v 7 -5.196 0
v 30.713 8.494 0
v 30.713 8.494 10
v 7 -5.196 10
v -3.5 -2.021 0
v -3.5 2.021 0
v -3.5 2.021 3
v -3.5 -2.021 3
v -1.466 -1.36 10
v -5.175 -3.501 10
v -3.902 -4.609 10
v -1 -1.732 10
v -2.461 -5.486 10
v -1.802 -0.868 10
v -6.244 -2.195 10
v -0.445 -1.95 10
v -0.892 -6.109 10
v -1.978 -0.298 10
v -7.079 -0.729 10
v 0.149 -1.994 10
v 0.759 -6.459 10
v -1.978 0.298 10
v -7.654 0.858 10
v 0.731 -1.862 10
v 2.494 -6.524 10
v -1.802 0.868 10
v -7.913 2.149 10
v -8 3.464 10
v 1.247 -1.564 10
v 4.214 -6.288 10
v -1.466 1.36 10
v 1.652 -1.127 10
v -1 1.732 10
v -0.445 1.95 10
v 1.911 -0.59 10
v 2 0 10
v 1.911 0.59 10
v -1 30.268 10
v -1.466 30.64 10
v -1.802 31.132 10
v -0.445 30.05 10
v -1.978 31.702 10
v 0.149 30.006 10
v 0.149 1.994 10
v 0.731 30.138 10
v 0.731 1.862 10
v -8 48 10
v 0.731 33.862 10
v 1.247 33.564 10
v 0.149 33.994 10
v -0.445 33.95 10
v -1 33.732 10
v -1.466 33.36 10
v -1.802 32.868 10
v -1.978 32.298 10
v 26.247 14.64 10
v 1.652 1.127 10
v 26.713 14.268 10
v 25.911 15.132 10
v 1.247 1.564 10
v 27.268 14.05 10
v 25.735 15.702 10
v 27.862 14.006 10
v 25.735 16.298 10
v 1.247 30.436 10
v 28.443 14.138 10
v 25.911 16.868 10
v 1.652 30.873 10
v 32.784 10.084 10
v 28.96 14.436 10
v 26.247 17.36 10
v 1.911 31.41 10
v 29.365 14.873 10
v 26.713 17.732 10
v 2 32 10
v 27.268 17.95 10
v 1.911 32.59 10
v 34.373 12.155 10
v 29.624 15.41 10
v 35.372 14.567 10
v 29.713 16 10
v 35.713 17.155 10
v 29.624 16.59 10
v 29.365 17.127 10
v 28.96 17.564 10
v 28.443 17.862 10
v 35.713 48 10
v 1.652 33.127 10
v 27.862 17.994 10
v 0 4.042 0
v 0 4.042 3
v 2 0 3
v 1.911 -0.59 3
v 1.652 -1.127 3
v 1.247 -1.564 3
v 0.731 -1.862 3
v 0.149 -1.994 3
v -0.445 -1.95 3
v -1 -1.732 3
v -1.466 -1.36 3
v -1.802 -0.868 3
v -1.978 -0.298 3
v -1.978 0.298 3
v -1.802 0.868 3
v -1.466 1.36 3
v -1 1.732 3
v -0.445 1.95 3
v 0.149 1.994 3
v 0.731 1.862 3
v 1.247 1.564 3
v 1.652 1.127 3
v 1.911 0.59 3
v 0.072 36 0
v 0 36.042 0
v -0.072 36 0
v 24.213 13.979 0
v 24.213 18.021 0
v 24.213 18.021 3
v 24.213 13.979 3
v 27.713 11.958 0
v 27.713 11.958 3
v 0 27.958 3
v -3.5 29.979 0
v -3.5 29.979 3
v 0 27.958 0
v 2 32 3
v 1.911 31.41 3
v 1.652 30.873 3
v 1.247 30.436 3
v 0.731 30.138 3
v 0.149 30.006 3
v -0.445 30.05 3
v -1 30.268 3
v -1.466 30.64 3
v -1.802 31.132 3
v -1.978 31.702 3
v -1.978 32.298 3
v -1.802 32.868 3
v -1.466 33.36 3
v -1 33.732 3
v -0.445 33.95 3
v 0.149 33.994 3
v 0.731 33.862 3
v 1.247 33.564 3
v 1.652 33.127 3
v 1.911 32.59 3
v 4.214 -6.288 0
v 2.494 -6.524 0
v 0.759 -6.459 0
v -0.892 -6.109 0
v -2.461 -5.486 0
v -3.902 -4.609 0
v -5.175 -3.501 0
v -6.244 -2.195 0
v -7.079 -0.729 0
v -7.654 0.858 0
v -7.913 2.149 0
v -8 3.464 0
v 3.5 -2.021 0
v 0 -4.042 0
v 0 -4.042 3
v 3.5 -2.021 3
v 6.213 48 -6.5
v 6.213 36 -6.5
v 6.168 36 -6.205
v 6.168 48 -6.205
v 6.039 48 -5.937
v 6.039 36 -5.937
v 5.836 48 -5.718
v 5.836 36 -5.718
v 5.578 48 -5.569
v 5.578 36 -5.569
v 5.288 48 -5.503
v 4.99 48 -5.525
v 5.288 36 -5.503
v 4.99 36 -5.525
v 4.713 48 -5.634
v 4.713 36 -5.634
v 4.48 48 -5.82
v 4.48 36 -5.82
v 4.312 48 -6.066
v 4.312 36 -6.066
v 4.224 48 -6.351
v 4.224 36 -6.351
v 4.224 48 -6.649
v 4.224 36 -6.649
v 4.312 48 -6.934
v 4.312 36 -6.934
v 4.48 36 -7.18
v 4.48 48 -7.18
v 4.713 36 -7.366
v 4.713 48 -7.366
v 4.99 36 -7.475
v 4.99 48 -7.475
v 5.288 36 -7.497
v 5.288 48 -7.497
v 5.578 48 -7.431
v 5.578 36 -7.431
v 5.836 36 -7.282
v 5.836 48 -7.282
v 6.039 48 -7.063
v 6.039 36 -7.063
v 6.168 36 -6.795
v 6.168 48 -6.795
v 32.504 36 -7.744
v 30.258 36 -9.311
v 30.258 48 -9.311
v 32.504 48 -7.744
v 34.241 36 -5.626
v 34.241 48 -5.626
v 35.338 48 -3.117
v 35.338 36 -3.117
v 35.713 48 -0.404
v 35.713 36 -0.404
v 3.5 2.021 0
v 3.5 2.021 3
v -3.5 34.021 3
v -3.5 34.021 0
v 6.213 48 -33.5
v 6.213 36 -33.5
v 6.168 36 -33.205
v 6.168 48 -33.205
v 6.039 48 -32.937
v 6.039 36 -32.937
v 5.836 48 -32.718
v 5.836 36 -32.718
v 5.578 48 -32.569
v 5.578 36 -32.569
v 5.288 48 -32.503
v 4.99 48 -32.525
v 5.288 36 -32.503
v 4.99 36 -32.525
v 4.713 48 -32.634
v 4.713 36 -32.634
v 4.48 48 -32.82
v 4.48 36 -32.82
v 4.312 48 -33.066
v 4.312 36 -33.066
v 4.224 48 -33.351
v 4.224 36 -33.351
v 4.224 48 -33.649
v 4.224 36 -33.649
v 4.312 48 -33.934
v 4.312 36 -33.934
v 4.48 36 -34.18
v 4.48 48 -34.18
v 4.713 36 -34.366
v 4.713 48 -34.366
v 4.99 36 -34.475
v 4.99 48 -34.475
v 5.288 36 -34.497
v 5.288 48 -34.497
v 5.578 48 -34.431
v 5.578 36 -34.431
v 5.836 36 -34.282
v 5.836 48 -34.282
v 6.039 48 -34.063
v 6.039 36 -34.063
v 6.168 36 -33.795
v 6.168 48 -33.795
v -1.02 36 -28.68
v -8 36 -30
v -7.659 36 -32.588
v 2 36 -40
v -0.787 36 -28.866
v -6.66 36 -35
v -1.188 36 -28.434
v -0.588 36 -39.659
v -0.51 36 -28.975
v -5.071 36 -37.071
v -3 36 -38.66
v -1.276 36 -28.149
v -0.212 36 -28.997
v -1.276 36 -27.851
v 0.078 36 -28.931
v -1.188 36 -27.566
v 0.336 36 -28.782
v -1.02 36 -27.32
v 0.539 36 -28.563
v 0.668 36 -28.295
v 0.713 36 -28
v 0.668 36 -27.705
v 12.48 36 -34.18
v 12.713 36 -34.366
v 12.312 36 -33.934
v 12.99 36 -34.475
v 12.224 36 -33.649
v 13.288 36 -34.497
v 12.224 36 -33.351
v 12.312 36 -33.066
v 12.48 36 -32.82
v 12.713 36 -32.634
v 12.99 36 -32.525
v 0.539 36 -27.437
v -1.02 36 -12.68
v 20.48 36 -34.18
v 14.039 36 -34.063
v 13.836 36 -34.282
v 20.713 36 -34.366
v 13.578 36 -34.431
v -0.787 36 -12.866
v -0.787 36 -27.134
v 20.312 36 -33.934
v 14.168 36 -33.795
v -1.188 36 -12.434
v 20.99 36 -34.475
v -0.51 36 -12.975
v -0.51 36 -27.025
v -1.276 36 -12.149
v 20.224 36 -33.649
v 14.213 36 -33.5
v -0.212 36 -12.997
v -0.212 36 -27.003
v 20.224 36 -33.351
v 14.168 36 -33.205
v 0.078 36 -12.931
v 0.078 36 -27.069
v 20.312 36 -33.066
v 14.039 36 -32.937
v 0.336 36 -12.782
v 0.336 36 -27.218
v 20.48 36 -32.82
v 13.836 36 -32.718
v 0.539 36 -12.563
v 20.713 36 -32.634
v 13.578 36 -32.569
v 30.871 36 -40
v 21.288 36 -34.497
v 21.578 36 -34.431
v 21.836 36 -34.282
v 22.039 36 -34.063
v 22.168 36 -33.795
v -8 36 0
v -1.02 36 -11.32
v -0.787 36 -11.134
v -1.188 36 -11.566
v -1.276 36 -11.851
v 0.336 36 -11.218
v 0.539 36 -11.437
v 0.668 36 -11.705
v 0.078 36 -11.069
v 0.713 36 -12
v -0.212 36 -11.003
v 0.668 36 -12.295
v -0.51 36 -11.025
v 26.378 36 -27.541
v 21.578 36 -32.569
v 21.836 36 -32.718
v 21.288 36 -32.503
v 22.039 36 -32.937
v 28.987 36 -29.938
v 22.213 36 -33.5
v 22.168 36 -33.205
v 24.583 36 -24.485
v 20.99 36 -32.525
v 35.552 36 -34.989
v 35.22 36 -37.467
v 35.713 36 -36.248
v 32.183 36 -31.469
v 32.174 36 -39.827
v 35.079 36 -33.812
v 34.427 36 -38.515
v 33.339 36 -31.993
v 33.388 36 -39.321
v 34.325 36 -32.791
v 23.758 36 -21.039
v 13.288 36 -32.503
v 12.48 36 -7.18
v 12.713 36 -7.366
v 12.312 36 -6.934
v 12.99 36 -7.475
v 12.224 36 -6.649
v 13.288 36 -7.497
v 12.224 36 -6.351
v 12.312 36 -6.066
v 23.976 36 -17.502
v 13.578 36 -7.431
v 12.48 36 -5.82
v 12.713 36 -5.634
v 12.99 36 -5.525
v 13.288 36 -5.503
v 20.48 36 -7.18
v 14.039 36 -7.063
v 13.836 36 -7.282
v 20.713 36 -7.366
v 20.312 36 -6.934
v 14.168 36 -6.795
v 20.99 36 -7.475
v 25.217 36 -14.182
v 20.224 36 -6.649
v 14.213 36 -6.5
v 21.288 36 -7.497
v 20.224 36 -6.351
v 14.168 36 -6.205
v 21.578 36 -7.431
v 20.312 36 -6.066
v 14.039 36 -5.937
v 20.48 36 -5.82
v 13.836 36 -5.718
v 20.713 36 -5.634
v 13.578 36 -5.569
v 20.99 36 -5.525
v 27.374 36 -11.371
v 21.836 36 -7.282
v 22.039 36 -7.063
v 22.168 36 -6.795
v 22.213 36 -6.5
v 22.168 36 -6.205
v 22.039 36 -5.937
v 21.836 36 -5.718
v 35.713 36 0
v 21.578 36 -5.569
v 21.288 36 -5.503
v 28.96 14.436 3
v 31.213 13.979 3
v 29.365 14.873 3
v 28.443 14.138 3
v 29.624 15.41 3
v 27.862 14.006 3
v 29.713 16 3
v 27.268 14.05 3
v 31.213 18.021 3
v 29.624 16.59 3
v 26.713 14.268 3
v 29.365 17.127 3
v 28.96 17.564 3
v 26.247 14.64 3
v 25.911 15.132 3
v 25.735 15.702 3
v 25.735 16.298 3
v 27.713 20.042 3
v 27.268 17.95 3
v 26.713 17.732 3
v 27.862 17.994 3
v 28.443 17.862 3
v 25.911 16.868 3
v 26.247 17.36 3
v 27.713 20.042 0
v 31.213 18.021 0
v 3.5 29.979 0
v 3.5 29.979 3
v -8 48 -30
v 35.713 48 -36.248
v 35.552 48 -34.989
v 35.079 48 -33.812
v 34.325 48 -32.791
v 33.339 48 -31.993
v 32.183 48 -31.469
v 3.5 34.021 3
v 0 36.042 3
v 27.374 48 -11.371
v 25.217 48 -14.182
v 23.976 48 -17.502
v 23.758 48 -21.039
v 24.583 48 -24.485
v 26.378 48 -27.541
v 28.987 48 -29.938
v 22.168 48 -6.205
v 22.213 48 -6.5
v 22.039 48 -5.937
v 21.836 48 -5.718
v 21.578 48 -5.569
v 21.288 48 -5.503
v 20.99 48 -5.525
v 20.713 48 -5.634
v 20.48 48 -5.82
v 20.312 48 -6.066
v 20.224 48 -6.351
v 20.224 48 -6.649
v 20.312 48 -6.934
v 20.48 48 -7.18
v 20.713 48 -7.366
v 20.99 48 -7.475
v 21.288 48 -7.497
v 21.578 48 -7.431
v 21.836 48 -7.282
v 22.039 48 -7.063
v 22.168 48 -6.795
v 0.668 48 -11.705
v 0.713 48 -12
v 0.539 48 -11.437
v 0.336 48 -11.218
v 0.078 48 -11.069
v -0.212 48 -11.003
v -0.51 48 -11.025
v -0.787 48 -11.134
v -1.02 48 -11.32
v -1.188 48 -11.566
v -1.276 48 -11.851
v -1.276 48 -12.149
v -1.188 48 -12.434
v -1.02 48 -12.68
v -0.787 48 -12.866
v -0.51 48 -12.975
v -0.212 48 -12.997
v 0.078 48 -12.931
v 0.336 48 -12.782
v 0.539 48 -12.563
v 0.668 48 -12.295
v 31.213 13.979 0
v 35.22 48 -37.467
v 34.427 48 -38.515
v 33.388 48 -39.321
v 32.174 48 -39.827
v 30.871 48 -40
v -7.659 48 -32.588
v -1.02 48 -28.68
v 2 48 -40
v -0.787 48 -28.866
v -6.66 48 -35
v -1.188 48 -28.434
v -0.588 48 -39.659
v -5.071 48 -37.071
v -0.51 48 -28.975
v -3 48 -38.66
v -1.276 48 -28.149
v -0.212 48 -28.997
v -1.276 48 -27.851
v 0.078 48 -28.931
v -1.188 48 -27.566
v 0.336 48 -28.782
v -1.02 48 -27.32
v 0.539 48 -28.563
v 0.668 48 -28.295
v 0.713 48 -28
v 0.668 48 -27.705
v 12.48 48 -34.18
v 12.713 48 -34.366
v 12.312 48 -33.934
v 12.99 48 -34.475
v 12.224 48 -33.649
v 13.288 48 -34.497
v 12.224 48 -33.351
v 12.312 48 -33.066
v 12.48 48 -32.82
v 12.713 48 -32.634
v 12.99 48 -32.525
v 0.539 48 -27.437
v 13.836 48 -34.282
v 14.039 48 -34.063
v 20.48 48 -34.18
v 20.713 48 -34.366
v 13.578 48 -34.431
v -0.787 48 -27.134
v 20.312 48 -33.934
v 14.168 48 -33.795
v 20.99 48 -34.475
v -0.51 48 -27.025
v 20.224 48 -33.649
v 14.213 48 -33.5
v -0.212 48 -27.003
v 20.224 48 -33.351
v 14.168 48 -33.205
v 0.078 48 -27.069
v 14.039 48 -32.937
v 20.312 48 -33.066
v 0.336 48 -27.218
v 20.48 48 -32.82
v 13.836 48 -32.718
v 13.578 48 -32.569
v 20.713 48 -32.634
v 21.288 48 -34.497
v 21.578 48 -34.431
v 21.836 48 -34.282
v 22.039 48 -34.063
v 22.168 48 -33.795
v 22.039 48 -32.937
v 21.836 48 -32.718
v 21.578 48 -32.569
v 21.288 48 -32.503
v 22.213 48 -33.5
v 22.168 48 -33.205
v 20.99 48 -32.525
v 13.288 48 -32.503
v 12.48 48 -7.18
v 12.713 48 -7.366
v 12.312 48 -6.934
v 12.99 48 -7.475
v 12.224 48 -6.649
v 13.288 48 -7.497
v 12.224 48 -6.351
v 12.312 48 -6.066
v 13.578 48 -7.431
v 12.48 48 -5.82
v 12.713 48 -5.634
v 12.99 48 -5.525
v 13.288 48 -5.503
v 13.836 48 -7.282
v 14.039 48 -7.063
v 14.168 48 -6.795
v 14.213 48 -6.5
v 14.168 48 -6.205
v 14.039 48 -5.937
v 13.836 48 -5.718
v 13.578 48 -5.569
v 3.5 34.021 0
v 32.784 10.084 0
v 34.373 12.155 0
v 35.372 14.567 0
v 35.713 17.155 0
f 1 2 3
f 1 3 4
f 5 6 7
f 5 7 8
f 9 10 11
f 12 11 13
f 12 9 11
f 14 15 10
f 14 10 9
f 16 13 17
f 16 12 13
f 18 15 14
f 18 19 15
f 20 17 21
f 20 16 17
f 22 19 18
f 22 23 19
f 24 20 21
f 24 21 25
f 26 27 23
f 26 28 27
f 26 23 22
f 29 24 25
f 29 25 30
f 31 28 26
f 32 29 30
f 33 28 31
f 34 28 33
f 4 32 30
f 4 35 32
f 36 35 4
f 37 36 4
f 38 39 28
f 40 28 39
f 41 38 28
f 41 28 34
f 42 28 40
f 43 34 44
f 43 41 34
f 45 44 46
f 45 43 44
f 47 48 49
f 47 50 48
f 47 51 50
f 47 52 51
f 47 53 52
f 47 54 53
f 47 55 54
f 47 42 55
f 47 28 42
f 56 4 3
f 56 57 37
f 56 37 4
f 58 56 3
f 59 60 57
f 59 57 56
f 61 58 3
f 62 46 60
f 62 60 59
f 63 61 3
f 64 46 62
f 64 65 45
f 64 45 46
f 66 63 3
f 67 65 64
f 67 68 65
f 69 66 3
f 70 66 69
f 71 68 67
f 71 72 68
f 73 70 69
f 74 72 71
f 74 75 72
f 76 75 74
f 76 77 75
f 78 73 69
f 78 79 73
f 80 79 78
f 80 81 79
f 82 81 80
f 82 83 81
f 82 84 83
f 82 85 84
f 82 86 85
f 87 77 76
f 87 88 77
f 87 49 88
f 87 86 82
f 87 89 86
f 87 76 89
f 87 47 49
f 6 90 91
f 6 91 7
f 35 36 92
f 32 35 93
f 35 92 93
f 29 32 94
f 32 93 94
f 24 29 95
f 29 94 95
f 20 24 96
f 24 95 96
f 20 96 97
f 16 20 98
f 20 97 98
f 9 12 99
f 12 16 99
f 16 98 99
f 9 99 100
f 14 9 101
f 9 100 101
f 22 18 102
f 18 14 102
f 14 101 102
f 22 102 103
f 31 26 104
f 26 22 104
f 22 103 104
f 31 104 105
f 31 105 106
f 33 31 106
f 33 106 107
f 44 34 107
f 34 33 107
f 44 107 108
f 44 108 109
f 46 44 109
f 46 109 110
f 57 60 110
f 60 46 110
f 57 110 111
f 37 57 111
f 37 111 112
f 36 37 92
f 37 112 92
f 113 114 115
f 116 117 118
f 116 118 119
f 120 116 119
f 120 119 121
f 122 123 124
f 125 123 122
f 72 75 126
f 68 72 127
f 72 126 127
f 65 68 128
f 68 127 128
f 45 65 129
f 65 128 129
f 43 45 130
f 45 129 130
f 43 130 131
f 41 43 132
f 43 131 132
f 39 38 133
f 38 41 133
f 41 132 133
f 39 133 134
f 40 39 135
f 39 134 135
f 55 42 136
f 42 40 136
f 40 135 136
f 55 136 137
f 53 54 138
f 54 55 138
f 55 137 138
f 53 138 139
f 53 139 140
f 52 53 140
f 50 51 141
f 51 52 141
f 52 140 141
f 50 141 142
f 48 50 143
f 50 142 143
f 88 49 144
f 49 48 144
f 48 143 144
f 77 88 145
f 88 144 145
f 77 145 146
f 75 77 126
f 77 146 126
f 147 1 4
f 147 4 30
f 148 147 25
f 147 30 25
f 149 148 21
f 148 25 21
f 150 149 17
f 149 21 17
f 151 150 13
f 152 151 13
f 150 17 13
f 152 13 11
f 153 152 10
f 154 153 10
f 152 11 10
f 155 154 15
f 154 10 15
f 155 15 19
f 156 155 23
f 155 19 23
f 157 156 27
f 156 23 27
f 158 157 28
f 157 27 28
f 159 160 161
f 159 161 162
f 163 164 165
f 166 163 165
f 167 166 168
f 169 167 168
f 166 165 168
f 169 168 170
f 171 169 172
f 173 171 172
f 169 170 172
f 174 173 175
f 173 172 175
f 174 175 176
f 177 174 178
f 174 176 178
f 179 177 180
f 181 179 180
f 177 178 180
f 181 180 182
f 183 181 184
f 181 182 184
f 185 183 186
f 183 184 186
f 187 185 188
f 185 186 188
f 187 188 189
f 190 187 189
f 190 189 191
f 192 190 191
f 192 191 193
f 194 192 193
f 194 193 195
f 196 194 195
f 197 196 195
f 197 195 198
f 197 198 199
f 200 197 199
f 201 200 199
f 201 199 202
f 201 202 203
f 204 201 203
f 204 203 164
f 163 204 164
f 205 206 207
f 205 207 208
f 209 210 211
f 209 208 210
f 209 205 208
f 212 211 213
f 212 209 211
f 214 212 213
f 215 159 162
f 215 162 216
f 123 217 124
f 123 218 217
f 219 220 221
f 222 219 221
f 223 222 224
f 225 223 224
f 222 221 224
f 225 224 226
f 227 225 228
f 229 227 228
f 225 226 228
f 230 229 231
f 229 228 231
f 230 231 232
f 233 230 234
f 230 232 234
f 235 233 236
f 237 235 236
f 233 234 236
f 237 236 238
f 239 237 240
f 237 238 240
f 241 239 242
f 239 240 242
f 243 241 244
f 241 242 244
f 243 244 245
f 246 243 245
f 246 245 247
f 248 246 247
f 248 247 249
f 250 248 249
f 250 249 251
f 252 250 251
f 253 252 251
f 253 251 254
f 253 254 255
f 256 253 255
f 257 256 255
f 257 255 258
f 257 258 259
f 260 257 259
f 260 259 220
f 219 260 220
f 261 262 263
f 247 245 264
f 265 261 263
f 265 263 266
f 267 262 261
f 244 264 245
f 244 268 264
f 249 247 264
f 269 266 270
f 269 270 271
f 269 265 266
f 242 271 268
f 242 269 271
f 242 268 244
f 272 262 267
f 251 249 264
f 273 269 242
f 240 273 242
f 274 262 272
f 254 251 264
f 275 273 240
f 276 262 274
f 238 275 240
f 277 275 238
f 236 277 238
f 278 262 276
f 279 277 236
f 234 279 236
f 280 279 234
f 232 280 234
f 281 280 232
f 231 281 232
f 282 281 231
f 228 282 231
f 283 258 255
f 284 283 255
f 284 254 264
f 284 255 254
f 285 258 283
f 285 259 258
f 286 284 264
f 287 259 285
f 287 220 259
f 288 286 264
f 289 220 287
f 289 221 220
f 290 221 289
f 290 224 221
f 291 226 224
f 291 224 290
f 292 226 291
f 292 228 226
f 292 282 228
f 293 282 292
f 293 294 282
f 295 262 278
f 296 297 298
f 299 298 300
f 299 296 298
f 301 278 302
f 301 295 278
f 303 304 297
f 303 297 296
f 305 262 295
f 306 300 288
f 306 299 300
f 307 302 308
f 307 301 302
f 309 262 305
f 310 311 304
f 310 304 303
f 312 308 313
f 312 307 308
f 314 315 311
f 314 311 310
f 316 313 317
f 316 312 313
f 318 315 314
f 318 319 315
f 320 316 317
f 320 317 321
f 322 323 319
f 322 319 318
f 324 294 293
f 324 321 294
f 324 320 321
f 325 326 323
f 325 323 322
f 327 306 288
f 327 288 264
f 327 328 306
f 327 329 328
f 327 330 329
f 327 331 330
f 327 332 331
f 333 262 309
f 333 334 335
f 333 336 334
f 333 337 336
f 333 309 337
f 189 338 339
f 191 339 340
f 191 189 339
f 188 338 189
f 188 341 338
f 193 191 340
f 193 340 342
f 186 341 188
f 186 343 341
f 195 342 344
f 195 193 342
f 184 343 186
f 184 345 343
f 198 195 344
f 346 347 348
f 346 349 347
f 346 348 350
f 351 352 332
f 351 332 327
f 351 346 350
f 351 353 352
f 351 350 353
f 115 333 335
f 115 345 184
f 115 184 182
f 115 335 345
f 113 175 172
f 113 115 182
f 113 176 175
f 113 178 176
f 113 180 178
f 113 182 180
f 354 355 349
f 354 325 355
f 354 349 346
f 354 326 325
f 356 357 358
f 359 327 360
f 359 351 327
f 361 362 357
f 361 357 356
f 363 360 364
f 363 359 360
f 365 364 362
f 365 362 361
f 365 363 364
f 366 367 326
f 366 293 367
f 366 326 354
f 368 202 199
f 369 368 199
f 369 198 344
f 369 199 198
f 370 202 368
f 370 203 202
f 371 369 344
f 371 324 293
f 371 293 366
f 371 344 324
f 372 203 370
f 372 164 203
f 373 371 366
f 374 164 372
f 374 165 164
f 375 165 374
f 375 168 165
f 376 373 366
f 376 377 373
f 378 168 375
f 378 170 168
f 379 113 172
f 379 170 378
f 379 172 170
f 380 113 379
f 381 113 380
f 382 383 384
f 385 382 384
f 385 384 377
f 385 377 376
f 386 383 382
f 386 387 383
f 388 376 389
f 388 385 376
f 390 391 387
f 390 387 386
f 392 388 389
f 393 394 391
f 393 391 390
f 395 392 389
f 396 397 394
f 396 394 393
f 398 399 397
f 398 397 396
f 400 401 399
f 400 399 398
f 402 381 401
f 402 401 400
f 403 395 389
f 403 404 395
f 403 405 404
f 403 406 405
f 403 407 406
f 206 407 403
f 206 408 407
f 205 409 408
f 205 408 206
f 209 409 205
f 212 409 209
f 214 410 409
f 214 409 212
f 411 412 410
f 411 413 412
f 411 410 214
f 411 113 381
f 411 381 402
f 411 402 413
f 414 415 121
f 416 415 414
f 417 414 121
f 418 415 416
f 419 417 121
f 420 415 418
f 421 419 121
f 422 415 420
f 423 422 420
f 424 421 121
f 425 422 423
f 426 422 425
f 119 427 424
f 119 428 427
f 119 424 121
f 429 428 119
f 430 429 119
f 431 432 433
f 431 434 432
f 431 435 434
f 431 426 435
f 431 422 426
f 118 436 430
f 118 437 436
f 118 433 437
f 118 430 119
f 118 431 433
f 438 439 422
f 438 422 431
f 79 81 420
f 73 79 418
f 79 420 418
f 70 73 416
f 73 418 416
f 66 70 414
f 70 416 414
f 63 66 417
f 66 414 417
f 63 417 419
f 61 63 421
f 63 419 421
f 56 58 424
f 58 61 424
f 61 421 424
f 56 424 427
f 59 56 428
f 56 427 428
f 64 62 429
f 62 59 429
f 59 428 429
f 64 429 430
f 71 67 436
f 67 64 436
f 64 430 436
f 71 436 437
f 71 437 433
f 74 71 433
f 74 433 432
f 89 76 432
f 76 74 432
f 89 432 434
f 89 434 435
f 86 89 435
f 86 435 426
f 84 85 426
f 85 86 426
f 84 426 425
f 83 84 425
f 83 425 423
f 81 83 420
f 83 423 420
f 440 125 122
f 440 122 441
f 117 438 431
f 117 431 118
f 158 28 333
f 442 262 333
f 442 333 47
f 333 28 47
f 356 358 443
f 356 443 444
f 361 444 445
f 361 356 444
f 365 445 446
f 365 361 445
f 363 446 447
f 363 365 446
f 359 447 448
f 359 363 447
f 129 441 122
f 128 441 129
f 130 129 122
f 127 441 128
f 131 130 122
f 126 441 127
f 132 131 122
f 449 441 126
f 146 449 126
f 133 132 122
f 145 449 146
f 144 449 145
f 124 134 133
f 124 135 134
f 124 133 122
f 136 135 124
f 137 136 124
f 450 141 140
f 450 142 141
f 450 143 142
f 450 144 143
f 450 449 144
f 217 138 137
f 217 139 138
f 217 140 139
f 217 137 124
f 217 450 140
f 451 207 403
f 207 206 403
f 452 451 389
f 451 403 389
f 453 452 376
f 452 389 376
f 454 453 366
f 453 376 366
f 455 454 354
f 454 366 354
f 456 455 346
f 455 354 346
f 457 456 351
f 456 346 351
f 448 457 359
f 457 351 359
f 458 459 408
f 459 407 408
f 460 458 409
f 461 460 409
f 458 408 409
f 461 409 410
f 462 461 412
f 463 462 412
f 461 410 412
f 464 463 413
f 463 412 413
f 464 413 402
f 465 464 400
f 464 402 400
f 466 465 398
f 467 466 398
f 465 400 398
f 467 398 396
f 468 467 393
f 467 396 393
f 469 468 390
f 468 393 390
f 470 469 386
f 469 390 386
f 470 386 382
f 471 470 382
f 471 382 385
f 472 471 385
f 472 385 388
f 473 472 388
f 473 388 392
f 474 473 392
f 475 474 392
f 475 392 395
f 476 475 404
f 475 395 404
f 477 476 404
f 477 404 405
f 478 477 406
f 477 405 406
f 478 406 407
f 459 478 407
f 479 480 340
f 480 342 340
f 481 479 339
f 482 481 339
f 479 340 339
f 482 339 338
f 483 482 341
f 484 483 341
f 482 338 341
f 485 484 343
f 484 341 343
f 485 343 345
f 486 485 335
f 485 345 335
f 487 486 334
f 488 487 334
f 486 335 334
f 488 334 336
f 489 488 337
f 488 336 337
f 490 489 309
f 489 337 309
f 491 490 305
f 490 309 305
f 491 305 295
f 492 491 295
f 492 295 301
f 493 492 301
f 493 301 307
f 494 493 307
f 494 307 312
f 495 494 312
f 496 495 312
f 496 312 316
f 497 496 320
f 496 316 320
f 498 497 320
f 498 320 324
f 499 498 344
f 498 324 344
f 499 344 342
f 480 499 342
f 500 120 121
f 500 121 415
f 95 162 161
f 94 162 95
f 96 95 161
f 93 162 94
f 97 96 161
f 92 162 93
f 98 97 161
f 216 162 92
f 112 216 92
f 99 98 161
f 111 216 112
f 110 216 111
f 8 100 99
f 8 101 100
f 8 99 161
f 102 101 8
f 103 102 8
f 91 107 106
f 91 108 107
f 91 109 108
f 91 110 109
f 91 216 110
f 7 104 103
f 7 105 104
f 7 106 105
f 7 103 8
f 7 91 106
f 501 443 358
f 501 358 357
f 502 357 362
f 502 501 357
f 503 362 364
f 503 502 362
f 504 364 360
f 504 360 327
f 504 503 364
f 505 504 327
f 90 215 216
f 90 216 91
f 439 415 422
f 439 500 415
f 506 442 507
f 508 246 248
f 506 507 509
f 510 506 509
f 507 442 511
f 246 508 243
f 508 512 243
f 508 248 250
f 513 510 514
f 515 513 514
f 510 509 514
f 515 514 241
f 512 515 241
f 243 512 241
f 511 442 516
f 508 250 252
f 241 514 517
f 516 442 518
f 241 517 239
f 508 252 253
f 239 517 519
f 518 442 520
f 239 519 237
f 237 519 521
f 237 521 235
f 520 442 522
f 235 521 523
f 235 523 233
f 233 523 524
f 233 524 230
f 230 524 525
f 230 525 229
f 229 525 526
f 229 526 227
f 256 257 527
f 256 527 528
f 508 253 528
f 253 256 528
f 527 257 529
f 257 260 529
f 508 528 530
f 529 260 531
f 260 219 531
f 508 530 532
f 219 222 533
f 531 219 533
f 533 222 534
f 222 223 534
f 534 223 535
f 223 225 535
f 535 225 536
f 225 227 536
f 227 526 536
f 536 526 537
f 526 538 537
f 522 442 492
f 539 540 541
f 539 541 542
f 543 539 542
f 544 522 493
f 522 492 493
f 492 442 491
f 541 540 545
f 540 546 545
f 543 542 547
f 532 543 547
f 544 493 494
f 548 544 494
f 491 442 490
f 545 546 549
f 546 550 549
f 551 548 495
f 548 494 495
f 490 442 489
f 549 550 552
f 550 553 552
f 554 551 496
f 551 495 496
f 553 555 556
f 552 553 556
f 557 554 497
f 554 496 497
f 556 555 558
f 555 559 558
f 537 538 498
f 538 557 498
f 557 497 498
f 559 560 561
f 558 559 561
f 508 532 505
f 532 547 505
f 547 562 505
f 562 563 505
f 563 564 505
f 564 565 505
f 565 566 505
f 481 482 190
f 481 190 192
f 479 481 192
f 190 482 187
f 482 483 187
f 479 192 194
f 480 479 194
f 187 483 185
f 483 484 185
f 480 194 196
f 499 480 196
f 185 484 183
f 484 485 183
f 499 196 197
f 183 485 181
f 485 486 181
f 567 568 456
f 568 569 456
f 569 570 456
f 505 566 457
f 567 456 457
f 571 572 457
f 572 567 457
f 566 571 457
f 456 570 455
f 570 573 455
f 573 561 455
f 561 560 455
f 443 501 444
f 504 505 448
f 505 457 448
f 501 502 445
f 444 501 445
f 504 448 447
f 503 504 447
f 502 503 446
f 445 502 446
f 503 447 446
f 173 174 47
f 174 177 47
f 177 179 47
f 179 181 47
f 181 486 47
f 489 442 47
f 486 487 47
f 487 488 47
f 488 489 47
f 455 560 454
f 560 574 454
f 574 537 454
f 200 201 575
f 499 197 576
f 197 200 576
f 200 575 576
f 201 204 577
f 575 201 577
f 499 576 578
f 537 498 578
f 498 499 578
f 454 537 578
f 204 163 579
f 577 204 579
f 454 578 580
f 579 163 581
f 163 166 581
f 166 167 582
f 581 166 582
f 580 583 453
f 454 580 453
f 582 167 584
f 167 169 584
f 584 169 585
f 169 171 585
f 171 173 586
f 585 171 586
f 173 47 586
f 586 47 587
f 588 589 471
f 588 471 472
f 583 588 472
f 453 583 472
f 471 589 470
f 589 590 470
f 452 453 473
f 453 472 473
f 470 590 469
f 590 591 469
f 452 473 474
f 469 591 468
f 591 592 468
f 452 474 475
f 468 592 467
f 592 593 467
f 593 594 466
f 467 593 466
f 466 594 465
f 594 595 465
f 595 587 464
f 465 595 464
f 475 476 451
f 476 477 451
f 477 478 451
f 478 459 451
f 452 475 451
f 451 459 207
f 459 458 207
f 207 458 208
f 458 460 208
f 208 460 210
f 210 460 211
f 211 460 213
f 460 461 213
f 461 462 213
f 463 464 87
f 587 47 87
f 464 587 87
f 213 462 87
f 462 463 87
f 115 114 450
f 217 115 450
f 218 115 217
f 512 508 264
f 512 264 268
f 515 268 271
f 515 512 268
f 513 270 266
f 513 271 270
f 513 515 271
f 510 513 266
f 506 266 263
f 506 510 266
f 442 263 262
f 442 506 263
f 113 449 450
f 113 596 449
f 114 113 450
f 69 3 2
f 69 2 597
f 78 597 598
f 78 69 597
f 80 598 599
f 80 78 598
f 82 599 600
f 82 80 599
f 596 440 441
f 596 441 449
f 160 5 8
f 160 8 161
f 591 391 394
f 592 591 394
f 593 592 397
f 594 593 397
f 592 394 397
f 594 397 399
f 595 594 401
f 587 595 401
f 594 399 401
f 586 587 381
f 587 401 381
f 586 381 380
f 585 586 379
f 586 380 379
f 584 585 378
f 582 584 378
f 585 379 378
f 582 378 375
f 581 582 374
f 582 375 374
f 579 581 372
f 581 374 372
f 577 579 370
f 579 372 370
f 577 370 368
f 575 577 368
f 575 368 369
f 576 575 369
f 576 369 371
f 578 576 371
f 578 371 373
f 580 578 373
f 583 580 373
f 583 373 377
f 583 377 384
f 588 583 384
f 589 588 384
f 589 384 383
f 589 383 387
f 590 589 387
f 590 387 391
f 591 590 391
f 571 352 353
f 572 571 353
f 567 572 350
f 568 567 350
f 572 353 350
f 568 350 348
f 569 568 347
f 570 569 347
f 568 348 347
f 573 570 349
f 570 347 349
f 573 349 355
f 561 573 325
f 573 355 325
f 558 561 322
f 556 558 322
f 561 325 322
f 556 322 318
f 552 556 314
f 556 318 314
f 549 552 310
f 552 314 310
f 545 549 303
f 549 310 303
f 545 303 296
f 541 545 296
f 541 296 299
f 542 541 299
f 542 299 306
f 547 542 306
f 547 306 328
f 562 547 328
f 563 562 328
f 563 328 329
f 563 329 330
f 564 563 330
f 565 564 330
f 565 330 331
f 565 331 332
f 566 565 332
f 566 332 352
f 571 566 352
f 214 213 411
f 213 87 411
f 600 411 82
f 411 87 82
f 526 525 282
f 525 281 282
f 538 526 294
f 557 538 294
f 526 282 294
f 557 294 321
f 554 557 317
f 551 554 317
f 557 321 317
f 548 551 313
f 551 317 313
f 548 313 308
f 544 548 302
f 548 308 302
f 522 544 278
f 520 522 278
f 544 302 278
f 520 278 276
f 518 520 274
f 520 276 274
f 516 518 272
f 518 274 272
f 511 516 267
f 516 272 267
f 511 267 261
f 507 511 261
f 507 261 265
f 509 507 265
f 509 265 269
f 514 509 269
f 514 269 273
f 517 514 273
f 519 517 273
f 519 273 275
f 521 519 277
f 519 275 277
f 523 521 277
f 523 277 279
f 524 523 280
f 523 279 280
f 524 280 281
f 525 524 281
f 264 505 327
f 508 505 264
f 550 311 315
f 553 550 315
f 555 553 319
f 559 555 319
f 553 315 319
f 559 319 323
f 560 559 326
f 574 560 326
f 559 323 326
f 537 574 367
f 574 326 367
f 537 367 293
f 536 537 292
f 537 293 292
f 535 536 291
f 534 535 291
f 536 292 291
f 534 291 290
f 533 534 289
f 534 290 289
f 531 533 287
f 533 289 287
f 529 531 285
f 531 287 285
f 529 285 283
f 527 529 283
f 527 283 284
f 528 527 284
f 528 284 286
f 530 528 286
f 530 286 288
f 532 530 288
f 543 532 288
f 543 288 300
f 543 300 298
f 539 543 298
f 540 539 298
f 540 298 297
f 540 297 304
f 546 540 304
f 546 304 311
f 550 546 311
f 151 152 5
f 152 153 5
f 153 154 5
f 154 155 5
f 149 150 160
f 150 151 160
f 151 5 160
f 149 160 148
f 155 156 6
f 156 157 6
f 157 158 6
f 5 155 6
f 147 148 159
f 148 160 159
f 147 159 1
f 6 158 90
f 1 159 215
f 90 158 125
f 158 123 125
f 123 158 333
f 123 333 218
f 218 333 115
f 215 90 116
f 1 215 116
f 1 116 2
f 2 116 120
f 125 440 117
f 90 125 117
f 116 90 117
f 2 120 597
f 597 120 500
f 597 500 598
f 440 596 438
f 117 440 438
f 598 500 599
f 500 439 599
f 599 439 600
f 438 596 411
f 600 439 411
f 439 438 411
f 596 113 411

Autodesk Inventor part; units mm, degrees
ref_plane "YZ Plane" through (0, 0, 0) normal (1, 0, 0) x (0, 1, 0)
ref_plane "XZ Plane" through (0, 0, 0) normal (0, 1, 0) x (-1, 0, 0)
ref_plane "XY Plane" through (0, 0, 0) normal (0, 0, 1) x (1, 0, 0)
sketch "Esquisse1" plane through (0, 0, 0) normal (0, 0, 1) x (1, 0, 0)
  line L0 (0, 0) -> (0, 32) construction
  line L1 (0, 32) -> (27.7128, 16) construction
  line L2 (27.7128, 16) -> (0, 0) construction
  circle A0 centre (0, 0) radius 2
  circle A1 centre (0, 32) radius 2
  circle A2 centre (27.7128, 16) radius 2
  line L3 (0, 32) -> (0, 48) construction
  line L4 (35.7128, 48) -> (35.7128, 11.3812)
  line L5 (2.1436, -8) -> (-8, -8)
  line L6 (-8, -8) -> (-8, 48)
  line L7 (-8, 48) -> (35.7128, 48)
  line L8 (27.7128, 16) -> (35.7128, 16) construction
  line L9 (0, 0) -> (0, -8) construction
  line L10 (0, 32) -> (-8, 32) construction
  line L11 (27.7128, 16) -> (31.7128, 9.0718) construction
  line L12 (35.7128, 11.3812) -> (2.1436, -8)
  dimension "d0" = 32
  dimension "d1" = 32
  dimension "d2" = 32
  dimension "d3" = 4
  dimension "d4" = 16
  dimension "d5" = 8
  dimension "d6" = 8
  dimension "d7" = 8
  dimension "d27" = 8
extrude "Extrusion1" add sketch "Esquisse1" along normal blind 10
sketch "Esquisse2" plane through (0, 0, 0) normal (0, 0, -1) x (-1, 0, 0)
  circle A0 centre (-27.7128, 16) radius 2 projected
  circle A1 centre (0, 32) radius 2 projected
  circle A2 centre (0, 0) radius 2 projected
  line L0 (-35.7128, 48) -> (-35.7128, -8) projected
  line L1 (8, -8) -> (8, 48) projected
  line L2 (8, 48) -> (-35.7128, 48) projected
  line L3 (0, 27.9585) -> (-3.5, 29.9793)
  line L4 (-3.5, 29.9793) -> (-3.5, 34.0207)
  line L5 (-3.5, 34.0207) -> (0, 36.0415)
  line L6 (0, 36.0415) -> (3.5, 34.0207)
  line L7 (3.5, 34.0207) -> (3.5, 29.9793)
  line L8 (3.5, 29.9793) -> (0, 27.9585)
  line L9 (-3.5, 2.0207) -> (0, 4.0415)
  line L10 (0, 4.0415) -> (3.5, 2.0207)
  line L11 (3.5, 2.0207) -> (3.5, -2.0207)
  line L12 (3.5, -2.0207) -> (0, -4.0415)
  line L13 (0, -4.0415) -> (-3.5, -2.0207)
  line L14 (-3.5, -2.0207) -> (-3.5, 2.0207)
  line L15 (-3.5, 29.9793) -> (3.5, 29.9793) construction
  line L16 (-24.2128, 13.9793) -> (-27.7128, 11.9585)
  line L17 (-27.7128, 11.9585) -> (-31.2128, 13.9793)
  line L18 (-31.2128, 13.9793) -> (-31.2128, 18.0207)
  line L19 (-31.2128, 18.0207) -> (-27.7128, 20.0415)
  line L20 (-27.7128, 20.0415) -> (-24.2128, 18.0207)
  line L21 (-24.2128, 18.0207) -> (-24.2128, 13.9793)
  point P0 (-2.1436, -8)
  dimension "d10" = 7
extrude "Extrusion2" cut sketch "Esquisse2" against normal blind 3
sketch "Esquisse5" plane through (0, 0, 0) normal (0, 0, -1) x (-1, 0, 0)
  line L0 (-35.7128, 48) -> (-35.7128, 11.3812) projected
  line L1 (8, -8) -> (8, 48) projected
  line L2 (8, 48) -> (-35.7128, 48) projected
  line L3 (-35.7128, 48) -> (8, 48)
  line L4 (8, 48) -> (8, 36)
  line L5 (8, 36) -> (-35.7128, 36)
  line L6 (-35.7128, 36) -> (-35.7128, 48)
  point P0 (0, 0)
  dimension "d28" = 12
extrude "Extrusion5" add sketch "Esquisse5" along normal blind 40
sketch "Esquisse6" plane through (0.0718, 36, 0) normal (0, -1, 0) x (1, 0, 0)
  line L0 (-8.0718, 0) -> (-8.0718, -40) projected
  line L1 (35.641, 0) -> (35.641, -40) projected
  line L2 (35.641, -20) -> (-8.0718, -20) construction
  circle A0 centre (35.641, -20) radius 12
  line L3 (35.641, -20) -> (35.641, -6.5) construction
  line L4 (35.641, -6.5) -> (29.141, -6.5) construction
  line L5 (29.141, -6.5) -> (21.141, -6.5) construction
  line L6 (21.141, -6.5) -> (13.141, -6.5) construction
  line L7 (13.141, -6.5) -> (5.141, -6.5) construction
  line L8 (35.641, -20) -> (-0.359, -20) construction
  line L9 (-0.359, -20) -> (-0.359, -12) construction
  circle A1 centre (-0.359, -12) radius 1
  circle A2 centre (5.141, -6.5) radius 1
  circle A3 centre (13.141, -6.5) radius 1
  circle A4 centre (21.141, -6.5) radius 1
  circle A5 centre (-0.359, -28) radius 1
  circle A6 centre (5.141, -33.5) radius 1
  circle A7 centre (13.141, -33.5) radius 1
  circle A8 centre (21.141, -33.5) radius 1
  point P0 (-0.0718, 0)
  dimension "d31" = 24
  dimension "d32" = 13.5
  dimension "d33" = 6.5
  dimension "d34" = 8
  dimension "d35" = 8
  dimension "d36" = 8
  dimension "d37" = 36
  dimension "d38" = 8
  dimension "d39" = 2
extrude "Extrusion6" cut sketch "Esquisse6" against normal through all
fillet "Congé1" radius 10 1 edges at (-8, -8, 5)
fillet "Congé2" radius 10 1 edges at (35.7128, 11.3812, 5)
fillet "Congé3" radius 10 1 edges at (2.1436, -8, 5)
fillet "Congé4" radius 10 1 edges at (-8, 42, -40)
fillet "Congé5" radius 10 1 edges at (35.7128, 42, -8)
fillet "Congé6" radius 5 1 edges at (35.7128, 42, -32)
fillet "Congé7" radius 5 1 edges at (35.7128, 42, -40)
properties part number "joint3+ax12imprint_v4"
